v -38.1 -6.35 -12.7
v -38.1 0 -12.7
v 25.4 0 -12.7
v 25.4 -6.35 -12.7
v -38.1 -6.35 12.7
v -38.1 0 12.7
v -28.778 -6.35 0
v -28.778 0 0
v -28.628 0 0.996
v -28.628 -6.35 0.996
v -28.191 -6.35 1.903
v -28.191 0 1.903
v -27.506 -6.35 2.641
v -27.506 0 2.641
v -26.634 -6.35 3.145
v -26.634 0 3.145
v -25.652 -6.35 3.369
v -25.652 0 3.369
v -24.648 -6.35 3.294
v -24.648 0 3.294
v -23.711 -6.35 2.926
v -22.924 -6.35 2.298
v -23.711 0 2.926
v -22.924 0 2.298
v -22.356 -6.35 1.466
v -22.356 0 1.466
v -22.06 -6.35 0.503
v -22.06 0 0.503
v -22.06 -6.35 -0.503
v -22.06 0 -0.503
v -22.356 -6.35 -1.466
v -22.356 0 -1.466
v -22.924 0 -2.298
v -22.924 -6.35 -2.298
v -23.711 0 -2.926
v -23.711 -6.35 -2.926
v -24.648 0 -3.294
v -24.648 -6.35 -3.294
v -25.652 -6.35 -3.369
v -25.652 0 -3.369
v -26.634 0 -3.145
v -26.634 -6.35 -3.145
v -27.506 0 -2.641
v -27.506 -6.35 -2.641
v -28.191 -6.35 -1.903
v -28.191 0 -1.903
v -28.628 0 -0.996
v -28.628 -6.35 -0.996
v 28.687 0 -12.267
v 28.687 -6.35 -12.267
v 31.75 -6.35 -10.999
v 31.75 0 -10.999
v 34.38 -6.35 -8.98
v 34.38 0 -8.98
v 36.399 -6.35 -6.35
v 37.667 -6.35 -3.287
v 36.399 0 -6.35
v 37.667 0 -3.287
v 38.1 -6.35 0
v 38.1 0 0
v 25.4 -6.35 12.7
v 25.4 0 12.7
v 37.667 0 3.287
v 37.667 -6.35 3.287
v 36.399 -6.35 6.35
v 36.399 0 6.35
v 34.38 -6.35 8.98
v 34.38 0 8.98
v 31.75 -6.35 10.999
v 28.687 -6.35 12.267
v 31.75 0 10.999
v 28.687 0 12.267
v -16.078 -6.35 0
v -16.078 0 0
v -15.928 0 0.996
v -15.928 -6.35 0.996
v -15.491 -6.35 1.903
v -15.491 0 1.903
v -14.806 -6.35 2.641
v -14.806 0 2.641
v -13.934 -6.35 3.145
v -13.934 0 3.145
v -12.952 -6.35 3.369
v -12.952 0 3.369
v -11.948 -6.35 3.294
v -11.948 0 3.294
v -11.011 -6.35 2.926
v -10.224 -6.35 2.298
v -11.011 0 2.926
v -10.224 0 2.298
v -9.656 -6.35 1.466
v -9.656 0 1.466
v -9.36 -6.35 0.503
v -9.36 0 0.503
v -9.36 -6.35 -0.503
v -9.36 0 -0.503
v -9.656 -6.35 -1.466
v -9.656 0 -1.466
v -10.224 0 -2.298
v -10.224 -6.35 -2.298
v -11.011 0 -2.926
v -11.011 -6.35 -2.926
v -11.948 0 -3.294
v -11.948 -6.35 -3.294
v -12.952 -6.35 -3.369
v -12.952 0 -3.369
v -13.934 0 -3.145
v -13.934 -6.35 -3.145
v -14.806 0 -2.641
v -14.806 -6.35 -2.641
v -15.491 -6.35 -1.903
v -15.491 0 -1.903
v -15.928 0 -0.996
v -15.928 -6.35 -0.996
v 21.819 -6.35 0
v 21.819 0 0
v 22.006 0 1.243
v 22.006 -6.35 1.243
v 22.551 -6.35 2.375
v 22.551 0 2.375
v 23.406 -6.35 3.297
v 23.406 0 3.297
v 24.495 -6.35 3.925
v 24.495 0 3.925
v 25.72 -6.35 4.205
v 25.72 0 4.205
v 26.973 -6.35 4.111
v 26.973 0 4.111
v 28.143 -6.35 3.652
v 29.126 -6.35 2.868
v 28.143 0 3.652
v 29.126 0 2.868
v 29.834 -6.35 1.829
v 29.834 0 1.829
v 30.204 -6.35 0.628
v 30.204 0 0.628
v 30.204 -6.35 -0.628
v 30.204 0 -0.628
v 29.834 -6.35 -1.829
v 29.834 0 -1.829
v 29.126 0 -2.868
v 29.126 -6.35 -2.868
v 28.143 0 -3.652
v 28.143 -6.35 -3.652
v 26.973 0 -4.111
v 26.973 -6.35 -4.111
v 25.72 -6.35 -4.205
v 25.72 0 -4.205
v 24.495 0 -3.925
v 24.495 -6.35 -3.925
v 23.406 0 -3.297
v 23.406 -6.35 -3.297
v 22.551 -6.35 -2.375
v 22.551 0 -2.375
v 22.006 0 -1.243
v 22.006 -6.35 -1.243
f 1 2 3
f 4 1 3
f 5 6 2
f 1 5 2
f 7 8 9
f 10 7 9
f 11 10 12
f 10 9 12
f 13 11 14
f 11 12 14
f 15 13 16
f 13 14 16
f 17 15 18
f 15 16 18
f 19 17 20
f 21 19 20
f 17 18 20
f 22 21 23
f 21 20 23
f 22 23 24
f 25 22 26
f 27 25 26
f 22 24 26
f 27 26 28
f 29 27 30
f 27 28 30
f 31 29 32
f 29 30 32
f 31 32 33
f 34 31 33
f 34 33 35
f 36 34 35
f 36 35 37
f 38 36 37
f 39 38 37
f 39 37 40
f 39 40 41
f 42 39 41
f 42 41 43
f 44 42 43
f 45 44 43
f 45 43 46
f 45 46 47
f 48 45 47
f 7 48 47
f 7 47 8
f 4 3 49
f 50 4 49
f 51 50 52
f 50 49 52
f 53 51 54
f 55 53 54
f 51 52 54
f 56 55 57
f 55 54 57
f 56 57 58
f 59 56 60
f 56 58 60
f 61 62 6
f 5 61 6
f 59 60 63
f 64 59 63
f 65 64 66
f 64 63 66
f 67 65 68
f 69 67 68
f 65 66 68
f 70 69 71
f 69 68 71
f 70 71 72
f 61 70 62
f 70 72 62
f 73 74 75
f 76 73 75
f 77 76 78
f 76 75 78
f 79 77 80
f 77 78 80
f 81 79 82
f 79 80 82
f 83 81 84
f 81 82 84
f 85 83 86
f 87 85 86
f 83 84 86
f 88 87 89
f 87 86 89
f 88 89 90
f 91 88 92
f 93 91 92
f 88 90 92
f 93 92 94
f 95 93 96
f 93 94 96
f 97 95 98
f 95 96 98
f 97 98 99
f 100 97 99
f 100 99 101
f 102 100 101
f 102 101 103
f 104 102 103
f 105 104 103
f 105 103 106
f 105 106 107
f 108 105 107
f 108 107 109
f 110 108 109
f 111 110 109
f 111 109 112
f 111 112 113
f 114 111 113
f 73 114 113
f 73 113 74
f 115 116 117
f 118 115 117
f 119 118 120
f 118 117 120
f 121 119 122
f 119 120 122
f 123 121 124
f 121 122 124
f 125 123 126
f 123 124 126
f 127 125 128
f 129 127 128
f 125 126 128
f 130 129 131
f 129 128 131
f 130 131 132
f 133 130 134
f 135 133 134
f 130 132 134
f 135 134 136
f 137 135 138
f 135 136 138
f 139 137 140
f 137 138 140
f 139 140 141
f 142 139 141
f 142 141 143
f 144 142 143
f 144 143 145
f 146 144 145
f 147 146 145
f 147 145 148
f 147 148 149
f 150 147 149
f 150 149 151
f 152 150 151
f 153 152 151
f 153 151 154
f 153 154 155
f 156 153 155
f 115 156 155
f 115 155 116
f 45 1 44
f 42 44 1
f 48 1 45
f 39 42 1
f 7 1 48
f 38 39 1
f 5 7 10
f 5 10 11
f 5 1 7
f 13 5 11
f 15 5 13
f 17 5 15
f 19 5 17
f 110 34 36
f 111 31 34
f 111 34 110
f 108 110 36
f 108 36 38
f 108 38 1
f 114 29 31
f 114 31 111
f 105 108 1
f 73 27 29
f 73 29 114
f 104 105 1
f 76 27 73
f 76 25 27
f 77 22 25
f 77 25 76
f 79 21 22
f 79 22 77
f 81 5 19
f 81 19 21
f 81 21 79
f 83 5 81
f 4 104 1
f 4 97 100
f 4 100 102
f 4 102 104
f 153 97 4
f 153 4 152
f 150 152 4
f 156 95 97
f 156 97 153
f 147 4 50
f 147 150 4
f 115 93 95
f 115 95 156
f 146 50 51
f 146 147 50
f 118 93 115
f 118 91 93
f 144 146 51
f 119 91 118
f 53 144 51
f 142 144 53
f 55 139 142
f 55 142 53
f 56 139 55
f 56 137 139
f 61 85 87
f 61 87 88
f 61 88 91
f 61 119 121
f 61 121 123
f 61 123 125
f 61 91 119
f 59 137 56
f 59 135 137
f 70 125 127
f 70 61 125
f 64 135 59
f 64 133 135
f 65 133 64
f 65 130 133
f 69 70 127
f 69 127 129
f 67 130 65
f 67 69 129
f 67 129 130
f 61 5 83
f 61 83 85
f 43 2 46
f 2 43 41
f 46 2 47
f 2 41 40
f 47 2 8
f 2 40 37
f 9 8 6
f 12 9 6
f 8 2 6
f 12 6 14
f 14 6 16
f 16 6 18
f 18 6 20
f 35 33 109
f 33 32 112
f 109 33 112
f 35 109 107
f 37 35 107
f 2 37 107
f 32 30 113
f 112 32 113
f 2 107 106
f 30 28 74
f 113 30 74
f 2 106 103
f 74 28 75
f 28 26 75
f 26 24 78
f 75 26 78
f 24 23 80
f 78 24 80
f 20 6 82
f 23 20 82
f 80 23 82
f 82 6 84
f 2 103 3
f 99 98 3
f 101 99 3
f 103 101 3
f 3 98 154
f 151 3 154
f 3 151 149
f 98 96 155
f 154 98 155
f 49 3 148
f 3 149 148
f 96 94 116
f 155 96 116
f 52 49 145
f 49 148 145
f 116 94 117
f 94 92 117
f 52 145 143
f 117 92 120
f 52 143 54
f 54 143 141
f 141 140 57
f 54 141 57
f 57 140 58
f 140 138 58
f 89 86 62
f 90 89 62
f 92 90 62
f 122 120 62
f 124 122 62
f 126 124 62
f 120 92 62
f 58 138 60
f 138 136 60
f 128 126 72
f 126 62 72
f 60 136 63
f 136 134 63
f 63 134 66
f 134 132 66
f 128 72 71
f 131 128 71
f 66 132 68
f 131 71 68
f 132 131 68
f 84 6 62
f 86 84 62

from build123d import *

# Parameters (mm, degrees)
F1_DEPTH = 6.35
F3_D     = 8.4328
F4_D     = 6.7564


with BuildPart() as f1:
    # F0 (on Front) → F1 (new body)
    with BuildSketch(Plane.XZ):
        with BuildLine():
            Line((-38.1, -12.7), (25.4, -12.7))
            ThreePointArc((25.4, -12.7), (34.380256, -8.980256), (38.1, 0))
            ThreePointArc((38.1, 0), (34.380256, 8.980256), (25.4, 12.7))
            Line((25.4, 12.7), (-38.1, 12.7))
            Line((-38.1, 12.7), (-38.1, -12.7))
        make_face()
    extrude(amount=F1_DEPTH)

    # F3 (through all)
    with Locations(Plane.XZ.offset(6.35)):
        with Locations((26.035, 0)):
            Hole(F3_D / 2)

    # F4 (through all)
    with Locations(Plane.XZ.offset(6.35)):
        with Locations((-25.4, 0), (-12.7, 0)):
            Hole(F4_D / 2)


solid = f1.part
